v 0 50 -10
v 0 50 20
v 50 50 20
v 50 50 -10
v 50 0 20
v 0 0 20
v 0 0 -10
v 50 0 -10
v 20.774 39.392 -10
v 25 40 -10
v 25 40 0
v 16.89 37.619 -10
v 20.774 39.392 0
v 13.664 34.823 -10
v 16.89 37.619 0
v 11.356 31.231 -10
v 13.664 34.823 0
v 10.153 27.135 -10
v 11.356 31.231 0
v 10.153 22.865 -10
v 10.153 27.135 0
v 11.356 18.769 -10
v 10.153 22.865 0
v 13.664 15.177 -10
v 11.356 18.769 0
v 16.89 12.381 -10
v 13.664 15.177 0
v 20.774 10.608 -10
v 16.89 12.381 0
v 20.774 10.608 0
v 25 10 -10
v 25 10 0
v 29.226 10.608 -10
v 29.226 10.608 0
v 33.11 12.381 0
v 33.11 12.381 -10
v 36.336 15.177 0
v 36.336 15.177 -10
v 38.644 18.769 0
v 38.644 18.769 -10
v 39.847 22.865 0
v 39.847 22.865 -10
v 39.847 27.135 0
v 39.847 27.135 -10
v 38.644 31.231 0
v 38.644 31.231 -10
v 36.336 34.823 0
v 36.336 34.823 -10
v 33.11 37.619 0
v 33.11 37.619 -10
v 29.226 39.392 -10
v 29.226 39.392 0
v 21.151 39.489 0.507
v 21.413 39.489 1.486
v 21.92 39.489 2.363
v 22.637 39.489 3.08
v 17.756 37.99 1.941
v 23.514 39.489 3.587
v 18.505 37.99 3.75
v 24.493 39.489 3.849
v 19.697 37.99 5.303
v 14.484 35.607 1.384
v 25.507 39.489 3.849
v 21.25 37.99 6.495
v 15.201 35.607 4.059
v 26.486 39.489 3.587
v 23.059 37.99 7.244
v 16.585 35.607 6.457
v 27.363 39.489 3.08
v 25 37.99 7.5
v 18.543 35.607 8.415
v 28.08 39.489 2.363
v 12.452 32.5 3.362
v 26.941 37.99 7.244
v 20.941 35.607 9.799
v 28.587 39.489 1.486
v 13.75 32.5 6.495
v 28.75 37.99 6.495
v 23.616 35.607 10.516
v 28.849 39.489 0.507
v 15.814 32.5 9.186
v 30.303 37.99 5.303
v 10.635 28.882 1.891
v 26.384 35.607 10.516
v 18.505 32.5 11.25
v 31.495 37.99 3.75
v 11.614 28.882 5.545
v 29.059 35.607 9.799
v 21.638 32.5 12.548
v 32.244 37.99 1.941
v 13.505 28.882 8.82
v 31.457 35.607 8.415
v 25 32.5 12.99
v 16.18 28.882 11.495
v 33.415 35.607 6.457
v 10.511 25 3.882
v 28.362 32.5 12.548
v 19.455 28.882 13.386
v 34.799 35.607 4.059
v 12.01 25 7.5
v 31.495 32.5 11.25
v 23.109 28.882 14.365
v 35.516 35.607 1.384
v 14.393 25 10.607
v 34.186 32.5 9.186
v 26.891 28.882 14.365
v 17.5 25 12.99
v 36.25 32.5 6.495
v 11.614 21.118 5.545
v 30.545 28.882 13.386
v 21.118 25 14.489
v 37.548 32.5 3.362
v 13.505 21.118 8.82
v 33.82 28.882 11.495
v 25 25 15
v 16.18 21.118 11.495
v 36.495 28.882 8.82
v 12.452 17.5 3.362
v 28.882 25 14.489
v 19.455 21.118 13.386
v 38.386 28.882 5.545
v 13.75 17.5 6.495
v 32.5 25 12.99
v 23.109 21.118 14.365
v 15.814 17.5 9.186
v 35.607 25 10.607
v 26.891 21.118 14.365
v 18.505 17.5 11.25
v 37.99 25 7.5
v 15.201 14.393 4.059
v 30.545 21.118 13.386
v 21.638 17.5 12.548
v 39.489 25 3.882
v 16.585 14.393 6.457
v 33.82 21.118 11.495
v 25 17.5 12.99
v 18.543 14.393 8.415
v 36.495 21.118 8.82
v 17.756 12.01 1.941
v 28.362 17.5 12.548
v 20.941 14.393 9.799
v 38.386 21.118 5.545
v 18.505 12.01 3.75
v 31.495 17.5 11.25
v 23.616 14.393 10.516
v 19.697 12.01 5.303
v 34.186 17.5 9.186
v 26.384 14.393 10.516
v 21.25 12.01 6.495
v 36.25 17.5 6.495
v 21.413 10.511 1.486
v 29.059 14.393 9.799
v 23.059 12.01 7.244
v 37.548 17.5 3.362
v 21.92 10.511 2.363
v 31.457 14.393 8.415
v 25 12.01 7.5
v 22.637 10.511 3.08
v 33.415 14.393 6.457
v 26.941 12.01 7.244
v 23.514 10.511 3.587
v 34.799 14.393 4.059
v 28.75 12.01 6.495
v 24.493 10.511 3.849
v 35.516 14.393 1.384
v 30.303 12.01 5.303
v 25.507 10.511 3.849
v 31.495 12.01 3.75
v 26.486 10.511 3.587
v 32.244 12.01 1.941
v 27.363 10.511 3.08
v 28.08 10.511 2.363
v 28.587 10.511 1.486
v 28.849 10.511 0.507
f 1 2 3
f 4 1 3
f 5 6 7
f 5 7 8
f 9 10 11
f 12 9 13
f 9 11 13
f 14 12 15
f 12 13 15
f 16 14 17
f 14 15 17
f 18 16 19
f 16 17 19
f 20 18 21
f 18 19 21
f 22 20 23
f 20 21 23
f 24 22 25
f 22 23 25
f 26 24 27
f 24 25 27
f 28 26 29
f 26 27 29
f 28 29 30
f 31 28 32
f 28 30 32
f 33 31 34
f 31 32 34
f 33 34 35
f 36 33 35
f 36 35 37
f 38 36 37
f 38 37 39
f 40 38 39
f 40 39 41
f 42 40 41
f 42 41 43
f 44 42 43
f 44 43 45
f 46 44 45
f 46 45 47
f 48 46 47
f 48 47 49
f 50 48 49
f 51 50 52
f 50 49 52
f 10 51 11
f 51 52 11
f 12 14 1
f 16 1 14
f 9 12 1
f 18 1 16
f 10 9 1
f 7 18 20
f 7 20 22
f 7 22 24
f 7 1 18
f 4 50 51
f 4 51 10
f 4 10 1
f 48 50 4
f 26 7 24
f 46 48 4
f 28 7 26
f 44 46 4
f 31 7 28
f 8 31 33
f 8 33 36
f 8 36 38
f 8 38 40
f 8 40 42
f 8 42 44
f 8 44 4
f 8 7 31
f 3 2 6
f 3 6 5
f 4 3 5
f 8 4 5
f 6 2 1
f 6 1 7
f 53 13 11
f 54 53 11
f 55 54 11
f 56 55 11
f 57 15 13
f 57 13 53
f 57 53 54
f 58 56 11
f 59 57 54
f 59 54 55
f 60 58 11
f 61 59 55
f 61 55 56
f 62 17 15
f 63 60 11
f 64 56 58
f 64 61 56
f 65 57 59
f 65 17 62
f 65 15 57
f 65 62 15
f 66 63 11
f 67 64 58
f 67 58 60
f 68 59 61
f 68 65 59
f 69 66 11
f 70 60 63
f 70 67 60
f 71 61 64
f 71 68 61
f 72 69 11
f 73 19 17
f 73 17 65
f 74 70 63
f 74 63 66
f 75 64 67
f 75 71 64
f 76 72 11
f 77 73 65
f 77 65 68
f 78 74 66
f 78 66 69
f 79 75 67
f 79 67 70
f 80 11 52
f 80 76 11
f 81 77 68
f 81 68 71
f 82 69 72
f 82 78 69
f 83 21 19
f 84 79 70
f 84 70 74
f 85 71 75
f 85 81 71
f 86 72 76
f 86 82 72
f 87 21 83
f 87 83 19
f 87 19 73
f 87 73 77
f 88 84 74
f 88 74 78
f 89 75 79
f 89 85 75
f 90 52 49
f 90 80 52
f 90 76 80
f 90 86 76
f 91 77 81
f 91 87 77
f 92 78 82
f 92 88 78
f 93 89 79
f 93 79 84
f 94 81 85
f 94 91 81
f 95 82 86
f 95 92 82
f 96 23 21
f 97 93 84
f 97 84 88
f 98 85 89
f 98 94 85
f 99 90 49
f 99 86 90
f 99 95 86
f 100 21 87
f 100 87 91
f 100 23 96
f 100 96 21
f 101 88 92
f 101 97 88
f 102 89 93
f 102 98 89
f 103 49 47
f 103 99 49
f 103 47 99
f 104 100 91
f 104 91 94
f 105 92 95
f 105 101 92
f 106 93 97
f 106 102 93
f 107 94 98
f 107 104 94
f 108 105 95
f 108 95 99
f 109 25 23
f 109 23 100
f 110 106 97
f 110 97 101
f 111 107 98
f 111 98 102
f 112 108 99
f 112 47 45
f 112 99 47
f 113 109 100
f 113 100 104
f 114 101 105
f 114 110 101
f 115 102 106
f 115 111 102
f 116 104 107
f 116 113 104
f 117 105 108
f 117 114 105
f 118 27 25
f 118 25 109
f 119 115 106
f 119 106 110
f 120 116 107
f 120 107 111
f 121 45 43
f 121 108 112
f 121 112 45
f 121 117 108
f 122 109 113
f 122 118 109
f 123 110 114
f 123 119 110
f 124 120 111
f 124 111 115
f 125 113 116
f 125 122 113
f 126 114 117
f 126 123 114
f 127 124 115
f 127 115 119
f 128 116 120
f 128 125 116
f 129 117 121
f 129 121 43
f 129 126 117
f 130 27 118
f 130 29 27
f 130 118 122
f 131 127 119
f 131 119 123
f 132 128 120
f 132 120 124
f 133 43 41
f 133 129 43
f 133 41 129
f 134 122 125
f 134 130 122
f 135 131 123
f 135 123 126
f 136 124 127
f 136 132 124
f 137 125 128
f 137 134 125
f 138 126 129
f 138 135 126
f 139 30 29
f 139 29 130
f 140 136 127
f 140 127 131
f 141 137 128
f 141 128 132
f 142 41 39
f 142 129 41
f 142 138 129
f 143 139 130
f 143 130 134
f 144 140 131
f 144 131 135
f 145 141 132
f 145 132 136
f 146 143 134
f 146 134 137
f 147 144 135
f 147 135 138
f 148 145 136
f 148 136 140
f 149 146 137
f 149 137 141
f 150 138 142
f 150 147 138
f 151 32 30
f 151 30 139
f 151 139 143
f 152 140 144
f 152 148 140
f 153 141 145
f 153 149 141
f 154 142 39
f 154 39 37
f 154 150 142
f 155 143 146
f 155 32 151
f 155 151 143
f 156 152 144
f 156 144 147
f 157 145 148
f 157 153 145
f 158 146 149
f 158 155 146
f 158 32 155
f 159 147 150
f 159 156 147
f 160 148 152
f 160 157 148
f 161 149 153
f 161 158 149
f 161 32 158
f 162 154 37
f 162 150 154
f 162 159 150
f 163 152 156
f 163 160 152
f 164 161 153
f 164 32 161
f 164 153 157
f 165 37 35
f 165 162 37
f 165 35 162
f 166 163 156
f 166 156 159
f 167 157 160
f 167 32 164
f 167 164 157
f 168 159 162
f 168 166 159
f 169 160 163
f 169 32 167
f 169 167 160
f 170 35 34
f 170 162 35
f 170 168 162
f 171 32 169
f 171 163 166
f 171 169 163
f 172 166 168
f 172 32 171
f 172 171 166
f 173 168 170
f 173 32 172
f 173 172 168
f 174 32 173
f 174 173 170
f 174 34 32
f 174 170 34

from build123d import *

# Parameters (mm, degrees)
F0_W     = 50
F0_H     = 50
F1_DEPTH = 30
F4_W     = 50
F4_H     = 50
F5_DEPTH = 10
F6_DEPTH = 10


with BuildPart() as f1:
    # F0 (on Top) → F1 (new body)
    with BuildSketch(Plane.XY):
        with Locations((25, 25)):
            Rectangle(F0_W, F0_H)
    extrude(amount=F1_DEPTH)

    # F2 (on face) → F3 (revolve, cut)
    with BuildSketch(Plane(origin=(0, 0, 0), x_dir=(1, 0, 0), z_dir=(0, 0, -1))):
        with BuildLine():
            ThreePointArc((25, -40), (35.6066017178, -35.6066017178), (40, -25))
            ThreePointArc((40, -25), (35.6066017178, -14.3933982822), (25, -10))
            Line((25, -10), (25, -40))
        make_face()
    revolve(axis=Axis((25, 25, 0), (0, 1, 0)), mode=Mode.SUBTRACT)

    # F4 (on face) → F5 (join)
    with BuildSketch(Plane(origin=(0, 0, 0), x_dir=(1, 0, 0), z_dir=(0, 0, -1))):
        with Locations((25, -25)):
            Rectangle(F4_W, F4_H)
        with BuildLine():
            ThreePointArc((25, -10), (40, -25), (25, -40))
            ThreePointArc((25, -40), (10, -25), (25, -10))
        make_face(mode=Mode.SUBTRACT)
    extrude(amount=F5_DEPTH)

    # F6 (cut): a face of the model
    f6_faces = [f1.faces().sort_by_distance(p)[0] for p in [
        (25, 25, 30),
    ]]
    extrude(f6_faces, amount=-F6_DEPTH, mode=Mode.SUBTRACT)


solid = f1.part
